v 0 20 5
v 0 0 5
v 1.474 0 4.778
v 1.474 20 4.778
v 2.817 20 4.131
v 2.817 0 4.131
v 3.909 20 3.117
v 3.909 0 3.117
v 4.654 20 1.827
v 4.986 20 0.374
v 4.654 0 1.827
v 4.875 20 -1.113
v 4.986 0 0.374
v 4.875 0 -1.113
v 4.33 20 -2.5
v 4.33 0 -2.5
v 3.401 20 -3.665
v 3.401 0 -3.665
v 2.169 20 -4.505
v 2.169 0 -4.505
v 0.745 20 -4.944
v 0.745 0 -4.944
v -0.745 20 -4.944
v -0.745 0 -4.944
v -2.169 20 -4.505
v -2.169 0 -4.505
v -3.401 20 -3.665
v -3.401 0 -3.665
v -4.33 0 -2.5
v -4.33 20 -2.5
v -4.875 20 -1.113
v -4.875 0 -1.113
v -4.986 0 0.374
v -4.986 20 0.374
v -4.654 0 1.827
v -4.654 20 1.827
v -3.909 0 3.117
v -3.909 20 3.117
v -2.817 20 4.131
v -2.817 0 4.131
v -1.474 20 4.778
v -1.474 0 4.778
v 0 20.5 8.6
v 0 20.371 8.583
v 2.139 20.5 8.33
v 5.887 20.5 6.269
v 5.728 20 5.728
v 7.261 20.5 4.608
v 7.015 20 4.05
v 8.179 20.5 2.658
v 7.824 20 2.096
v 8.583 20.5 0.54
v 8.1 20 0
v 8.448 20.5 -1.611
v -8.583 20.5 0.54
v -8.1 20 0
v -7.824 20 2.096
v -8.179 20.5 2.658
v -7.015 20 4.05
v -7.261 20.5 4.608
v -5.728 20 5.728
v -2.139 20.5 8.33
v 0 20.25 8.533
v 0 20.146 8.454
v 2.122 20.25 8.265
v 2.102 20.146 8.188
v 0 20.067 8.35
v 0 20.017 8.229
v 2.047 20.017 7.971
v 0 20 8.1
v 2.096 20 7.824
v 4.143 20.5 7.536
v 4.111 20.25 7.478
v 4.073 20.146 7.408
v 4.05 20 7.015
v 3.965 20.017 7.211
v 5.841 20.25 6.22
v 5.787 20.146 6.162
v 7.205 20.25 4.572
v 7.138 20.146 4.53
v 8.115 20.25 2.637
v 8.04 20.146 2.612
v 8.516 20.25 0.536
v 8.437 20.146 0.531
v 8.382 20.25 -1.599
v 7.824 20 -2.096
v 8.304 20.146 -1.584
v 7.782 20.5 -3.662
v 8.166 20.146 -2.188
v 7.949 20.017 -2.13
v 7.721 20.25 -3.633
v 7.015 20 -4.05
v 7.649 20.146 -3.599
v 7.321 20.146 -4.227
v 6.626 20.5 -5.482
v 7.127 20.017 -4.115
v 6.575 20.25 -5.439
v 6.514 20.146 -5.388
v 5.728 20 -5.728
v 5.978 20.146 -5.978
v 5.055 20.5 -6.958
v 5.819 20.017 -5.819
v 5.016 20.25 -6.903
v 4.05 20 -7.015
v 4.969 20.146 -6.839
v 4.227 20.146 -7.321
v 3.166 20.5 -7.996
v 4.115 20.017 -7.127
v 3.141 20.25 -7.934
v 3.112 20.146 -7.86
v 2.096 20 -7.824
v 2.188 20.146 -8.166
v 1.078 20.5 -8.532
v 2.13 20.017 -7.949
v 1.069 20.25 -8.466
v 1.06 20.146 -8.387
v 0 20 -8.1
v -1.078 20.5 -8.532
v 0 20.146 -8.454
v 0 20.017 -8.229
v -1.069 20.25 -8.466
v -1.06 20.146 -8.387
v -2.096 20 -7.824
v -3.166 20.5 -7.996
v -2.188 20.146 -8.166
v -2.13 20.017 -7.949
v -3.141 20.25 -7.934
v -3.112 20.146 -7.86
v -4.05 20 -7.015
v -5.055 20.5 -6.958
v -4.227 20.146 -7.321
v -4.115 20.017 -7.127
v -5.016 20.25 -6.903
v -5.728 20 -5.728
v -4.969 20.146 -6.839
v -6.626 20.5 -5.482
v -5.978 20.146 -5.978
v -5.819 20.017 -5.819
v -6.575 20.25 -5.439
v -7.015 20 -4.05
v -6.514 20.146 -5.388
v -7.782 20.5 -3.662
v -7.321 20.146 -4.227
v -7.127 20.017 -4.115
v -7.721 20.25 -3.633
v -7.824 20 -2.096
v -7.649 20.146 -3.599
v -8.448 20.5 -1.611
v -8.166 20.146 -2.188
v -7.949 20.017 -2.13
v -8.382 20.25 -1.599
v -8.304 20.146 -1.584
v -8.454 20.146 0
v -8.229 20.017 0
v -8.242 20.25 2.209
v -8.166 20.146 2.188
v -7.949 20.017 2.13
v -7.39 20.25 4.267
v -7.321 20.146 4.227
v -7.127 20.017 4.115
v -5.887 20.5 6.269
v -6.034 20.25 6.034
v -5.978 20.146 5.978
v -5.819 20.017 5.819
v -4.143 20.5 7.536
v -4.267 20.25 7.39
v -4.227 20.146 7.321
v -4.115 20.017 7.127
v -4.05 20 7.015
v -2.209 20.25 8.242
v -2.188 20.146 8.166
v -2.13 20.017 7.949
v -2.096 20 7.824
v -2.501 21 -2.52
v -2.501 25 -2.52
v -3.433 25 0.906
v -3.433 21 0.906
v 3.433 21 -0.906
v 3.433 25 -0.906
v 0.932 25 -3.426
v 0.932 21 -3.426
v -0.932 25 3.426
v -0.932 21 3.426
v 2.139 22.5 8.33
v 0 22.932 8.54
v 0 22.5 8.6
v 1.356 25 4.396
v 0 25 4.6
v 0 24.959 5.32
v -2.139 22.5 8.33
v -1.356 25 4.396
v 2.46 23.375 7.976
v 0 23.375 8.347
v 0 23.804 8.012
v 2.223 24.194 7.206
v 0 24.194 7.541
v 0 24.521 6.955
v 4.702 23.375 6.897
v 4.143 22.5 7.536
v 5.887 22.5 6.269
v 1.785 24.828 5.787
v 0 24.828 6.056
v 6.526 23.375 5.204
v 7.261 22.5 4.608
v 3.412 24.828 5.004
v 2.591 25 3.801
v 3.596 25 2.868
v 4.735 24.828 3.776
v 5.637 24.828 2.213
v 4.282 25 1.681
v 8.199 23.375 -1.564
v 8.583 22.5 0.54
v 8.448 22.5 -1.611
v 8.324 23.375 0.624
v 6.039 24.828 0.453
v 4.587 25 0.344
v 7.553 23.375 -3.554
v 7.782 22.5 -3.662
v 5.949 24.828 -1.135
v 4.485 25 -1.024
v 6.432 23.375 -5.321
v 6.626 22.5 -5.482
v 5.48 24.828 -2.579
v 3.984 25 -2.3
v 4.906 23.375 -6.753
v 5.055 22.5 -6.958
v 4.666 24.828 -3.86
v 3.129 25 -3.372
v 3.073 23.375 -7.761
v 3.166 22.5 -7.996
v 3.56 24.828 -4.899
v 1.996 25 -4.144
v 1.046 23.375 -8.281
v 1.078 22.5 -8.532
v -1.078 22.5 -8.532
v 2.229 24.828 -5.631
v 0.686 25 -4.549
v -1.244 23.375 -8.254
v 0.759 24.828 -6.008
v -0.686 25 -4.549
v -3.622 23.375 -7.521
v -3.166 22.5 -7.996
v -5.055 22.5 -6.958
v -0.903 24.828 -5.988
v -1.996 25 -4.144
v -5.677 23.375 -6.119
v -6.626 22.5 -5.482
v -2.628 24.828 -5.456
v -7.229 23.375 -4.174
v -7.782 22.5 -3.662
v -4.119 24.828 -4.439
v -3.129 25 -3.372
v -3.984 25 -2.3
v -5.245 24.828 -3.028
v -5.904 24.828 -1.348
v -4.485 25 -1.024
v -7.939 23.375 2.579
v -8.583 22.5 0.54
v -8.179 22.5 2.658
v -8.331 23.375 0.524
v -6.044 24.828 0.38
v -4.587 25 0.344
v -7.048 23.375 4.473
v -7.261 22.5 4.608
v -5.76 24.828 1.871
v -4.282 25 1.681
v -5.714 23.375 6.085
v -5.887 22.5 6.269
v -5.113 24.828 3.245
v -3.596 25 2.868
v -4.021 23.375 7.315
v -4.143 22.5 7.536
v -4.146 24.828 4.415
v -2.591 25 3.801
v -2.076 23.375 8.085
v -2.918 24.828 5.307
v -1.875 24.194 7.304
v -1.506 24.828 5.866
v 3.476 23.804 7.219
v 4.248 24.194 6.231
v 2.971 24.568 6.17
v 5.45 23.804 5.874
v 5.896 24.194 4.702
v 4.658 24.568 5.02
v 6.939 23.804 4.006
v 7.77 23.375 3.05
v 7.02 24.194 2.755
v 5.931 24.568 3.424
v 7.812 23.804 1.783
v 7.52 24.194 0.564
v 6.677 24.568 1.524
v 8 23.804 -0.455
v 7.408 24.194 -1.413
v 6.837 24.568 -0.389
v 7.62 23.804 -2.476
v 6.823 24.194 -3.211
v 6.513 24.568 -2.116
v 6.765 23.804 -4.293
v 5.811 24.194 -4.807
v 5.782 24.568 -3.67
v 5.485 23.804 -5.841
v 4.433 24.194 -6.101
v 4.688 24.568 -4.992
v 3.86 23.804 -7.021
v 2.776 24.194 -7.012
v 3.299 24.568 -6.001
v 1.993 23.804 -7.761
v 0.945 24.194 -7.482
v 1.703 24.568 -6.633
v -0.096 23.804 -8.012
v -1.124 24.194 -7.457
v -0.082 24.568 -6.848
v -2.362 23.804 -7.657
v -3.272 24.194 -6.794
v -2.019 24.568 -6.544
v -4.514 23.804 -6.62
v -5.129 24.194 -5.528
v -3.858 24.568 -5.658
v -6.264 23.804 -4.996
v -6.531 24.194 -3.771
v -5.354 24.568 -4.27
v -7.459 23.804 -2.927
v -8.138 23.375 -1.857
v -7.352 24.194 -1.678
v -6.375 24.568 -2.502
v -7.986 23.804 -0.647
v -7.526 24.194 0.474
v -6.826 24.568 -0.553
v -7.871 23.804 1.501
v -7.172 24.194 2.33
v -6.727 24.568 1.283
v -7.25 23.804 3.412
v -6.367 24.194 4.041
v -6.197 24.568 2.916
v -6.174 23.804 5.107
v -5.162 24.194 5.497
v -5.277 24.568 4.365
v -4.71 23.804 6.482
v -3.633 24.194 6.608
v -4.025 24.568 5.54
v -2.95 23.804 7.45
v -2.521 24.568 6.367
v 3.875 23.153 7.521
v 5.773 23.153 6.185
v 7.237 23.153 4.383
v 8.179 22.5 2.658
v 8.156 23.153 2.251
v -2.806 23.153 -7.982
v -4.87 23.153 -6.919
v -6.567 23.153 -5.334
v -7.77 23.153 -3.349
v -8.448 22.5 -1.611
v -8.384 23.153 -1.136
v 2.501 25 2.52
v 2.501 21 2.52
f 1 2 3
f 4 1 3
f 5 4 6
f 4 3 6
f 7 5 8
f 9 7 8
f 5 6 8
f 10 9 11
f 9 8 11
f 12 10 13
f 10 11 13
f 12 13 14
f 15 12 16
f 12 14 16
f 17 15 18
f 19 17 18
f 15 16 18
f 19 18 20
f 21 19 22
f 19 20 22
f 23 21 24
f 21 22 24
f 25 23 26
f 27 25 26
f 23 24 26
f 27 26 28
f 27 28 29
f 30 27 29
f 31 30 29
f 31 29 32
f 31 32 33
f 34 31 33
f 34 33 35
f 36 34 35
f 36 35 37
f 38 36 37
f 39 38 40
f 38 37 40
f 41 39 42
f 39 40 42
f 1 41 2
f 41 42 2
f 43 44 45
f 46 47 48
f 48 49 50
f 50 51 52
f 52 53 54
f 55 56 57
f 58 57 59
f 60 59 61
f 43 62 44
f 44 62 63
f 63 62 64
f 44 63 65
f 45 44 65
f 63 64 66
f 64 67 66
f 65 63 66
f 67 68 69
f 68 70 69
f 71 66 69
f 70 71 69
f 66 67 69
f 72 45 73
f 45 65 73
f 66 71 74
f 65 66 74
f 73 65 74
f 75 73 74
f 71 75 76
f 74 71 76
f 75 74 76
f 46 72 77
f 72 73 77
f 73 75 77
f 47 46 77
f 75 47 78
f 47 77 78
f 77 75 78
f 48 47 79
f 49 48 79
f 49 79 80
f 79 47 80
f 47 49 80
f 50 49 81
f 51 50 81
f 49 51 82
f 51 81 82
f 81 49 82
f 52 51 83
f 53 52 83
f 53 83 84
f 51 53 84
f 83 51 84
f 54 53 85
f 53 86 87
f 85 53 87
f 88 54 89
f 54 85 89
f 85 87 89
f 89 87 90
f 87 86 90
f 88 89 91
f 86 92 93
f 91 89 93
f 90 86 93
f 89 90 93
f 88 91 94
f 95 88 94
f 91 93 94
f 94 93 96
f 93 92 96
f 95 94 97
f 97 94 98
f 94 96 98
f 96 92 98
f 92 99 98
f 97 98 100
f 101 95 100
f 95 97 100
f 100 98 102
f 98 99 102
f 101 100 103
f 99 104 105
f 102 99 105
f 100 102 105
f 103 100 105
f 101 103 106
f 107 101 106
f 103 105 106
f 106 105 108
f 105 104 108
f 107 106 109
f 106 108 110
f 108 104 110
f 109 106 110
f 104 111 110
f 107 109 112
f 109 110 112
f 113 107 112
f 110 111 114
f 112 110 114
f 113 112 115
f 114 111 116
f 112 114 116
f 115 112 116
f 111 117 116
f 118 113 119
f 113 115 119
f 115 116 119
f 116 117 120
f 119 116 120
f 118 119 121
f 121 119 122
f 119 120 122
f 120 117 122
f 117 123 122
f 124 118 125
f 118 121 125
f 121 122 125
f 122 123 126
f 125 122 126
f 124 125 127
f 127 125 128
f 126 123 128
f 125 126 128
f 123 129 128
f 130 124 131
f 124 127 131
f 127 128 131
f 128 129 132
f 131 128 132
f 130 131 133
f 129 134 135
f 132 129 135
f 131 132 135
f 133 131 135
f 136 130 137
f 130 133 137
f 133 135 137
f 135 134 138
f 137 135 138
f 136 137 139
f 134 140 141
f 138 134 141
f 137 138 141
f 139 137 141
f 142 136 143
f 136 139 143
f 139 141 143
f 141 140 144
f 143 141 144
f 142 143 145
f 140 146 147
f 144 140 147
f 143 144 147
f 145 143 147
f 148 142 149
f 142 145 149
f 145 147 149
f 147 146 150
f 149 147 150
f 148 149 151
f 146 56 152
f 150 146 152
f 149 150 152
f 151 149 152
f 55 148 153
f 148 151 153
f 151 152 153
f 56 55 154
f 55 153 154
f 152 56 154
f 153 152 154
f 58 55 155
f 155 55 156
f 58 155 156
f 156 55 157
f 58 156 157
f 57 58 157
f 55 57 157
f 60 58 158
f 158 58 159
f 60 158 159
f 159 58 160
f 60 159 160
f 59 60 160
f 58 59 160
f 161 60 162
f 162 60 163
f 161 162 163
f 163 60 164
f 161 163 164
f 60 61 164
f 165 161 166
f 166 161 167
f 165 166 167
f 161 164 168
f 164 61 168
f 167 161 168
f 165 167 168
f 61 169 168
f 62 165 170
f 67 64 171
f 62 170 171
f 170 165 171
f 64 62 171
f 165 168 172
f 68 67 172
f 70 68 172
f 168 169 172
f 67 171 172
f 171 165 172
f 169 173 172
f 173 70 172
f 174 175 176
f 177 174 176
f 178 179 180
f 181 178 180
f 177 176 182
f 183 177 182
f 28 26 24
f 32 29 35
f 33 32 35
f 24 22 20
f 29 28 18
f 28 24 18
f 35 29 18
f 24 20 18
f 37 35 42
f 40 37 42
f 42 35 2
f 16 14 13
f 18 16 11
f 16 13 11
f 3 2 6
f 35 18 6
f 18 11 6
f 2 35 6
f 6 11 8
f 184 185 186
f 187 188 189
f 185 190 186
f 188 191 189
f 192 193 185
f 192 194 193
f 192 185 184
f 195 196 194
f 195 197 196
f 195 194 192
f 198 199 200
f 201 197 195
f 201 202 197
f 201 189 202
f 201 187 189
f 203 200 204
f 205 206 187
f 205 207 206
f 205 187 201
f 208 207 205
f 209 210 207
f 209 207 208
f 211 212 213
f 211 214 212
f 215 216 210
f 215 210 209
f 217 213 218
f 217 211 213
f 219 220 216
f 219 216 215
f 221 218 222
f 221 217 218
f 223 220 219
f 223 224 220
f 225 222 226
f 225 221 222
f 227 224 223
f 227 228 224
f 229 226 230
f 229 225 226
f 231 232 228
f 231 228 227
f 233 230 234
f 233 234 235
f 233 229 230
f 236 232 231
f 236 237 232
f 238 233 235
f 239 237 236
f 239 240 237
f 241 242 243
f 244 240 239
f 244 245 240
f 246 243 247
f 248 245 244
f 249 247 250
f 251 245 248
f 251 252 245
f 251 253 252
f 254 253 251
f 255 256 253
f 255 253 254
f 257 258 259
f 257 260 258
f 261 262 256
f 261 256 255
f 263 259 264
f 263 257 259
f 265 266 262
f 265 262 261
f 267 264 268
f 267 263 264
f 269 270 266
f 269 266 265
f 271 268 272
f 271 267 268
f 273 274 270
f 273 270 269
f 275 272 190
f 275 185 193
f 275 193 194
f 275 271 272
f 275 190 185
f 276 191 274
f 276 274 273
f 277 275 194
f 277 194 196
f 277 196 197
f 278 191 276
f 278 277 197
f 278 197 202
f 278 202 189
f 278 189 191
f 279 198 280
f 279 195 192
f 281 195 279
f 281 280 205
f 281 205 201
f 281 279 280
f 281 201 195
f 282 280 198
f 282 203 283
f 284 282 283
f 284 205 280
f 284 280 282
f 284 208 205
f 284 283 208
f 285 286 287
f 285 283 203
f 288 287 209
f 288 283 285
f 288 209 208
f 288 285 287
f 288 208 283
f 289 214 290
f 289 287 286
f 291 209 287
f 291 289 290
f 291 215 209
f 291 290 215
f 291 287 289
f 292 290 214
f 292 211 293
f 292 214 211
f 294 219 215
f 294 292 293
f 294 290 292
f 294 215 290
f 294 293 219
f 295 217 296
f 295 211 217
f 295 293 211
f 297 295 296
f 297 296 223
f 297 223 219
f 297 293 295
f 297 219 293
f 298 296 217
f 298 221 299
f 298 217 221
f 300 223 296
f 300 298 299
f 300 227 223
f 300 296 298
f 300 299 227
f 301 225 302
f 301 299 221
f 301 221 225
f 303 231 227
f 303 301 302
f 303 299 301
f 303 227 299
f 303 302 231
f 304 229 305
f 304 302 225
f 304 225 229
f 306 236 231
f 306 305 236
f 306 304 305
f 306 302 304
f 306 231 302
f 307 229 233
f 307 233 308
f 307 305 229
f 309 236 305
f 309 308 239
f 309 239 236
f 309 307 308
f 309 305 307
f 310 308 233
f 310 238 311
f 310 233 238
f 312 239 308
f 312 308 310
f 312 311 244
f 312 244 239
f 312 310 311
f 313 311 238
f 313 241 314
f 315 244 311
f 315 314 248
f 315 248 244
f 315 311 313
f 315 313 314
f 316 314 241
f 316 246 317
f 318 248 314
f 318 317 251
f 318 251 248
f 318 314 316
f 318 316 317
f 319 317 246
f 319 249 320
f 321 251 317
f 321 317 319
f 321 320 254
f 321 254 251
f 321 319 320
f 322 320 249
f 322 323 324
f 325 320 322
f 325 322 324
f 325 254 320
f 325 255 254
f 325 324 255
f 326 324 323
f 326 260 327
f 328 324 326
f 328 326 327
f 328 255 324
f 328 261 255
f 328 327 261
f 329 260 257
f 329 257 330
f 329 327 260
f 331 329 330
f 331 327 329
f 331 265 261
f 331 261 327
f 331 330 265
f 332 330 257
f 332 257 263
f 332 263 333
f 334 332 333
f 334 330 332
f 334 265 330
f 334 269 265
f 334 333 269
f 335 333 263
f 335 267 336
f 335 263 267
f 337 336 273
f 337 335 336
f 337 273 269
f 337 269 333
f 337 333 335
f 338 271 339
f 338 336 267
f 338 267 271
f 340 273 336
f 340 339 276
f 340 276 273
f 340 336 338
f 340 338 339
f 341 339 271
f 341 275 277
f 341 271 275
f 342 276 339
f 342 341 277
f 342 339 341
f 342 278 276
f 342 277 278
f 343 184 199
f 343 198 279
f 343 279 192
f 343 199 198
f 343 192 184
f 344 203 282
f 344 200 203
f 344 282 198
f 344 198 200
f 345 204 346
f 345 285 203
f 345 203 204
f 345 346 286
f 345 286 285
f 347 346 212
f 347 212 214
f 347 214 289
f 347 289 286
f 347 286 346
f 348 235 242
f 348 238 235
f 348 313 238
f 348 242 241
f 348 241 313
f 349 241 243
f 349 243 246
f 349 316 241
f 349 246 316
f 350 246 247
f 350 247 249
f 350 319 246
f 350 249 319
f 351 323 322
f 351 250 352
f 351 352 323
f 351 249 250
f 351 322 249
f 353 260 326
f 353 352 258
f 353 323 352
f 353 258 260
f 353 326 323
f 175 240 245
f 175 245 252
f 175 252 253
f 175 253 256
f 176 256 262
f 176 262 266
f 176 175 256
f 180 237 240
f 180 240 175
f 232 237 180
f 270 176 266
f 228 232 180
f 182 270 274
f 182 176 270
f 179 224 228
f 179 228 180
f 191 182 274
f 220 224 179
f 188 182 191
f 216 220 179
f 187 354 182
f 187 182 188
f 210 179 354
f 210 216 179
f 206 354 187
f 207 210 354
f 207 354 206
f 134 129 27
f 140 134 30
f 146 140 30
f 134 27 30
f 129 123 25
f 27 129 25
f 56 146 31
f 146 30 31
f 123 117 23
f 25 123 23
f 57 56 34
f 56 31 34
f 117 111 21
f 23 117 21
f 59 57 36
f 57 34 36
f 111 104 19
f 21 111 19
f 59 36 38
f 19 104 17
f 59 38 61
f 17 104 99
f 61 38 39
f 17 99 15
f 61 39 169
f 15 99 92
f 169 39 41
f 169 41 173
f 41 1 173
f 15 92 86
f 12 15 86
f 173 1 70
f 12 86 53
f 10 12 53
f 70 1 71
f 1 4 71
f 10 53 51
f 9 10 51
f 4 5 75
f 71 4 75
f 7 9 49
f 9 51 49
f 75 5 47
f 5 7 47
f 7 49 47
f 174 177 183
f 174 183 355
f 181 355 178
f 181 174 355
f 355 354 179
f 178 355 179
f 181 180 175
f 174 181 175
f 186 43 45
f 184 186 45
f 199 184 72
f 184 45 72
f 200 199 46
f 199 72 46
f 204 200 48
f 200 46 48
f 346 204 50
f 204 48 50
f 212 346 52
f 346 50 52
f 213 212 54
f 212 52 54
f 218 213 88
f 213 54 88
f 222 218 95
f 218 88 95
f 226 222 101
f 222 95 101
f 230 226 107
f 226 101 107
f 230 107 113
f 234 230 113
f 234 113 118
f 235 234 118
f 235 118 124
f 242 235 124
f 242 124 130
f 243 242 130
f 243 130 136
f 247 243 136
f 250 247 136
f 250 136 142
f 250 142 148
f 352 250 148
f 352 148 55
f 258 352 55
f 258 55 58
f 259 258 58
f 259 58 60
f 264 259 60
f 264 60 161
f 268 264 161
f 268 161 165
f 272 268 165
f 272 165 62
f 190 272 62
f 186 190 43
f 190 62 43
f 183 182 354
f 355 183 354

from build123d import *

# Parameters (mm, degrees)
SKETCH1_R           = 5
BOSS_EXTRUDE1_DEPTH = 20
SKETCH2_R           = 8.6
BOSS_EXTRUDE2_DEPTH = 5
FILLET1_SIZE        = 2.5
FILLET1_SIZE_2      = 4
CUT_EXTRUDE1_DEPTH  = 4
FILLET2_R           = 0.5


with BuildPart() as part:
    # Sketch1 → Boss-Extrude1 (new body)
    with BuildSketch(Plane(origin=(0, 0, 0), x_dir=(1, 0, 0), z_dir=(0, 1, 0))):
        with Locations(Location((0, 0, 0), (0, 0, 270))):
            Circle(SKETCH1_R)
    extrude(amount=BOSS_EXTRUDE1_DEPTH)

    # Sketch2 → Boss-Extrude2 (add)
    with BuildSketch(Plane(origin=(0, 20, 0), x_dir=(1, 0, 0), z_dir=(0, 1, 0))):
        with Locations(Location((0, 0, 0), (0, 0, 270))):
            Circle(SKETCH2_R)
    extrude(amount=BOSS_EXTRUDE2_DEPTH)

    # Fillet1
    # an asymmetric fillet: 4, 2.5 mm, written as the material it takes off along each edge
    with BuildSketch(Plane(origin=(0, 25, 0), x_dir=(0, 0, 1), z_dir=(-1, 0, 0))) as fillet1_piece_1:
        with BuildLine():
            Bezier((8.6, -FILLET1_SIZE), (8.6, 0), (8.6 - FILLET1_SIZE_2, 0), weights=[1, 0.707106781, 1])
            Line((8.6 - FILLET1_SIZE_2, 0), (8.6, 0))
            Line((8.6, 0), (8.6, -FILLET1_SIZE))
        make_face()
    revolve(axis=Axis((0, 25, 0), (0, 1, 0)), mode=Mode.SUBTRACT)

    # Sketch3 → Cut-Extrude1 (cut)
    with BuildSketch(Plane(origin=(0, 25, 0), x_dir=(1, 0, 0), z_dir=(0, 1, 0))):
        Polygon((2.501014418, -2.520402127), (3.433239479, 0.905740958), (0.93222506, 3.426143085), (-2.501014418, 2.520402127), (-3.433239479, -0.905740958), (-0.93222506, -3.426143085), align=None)
    extrude(amount=-CUT_EXTRUDE1_DEPTH, mode=Mode.SUBTRACT)

    # Fillet2
    fillet2_edges = [part.edges().sort_by_distance(p)[0] for p in [
        (0, 20, -8.6),
    ]]
    fillet(fillet2_edges, radius=FILLET2_R)


solid = part.part
